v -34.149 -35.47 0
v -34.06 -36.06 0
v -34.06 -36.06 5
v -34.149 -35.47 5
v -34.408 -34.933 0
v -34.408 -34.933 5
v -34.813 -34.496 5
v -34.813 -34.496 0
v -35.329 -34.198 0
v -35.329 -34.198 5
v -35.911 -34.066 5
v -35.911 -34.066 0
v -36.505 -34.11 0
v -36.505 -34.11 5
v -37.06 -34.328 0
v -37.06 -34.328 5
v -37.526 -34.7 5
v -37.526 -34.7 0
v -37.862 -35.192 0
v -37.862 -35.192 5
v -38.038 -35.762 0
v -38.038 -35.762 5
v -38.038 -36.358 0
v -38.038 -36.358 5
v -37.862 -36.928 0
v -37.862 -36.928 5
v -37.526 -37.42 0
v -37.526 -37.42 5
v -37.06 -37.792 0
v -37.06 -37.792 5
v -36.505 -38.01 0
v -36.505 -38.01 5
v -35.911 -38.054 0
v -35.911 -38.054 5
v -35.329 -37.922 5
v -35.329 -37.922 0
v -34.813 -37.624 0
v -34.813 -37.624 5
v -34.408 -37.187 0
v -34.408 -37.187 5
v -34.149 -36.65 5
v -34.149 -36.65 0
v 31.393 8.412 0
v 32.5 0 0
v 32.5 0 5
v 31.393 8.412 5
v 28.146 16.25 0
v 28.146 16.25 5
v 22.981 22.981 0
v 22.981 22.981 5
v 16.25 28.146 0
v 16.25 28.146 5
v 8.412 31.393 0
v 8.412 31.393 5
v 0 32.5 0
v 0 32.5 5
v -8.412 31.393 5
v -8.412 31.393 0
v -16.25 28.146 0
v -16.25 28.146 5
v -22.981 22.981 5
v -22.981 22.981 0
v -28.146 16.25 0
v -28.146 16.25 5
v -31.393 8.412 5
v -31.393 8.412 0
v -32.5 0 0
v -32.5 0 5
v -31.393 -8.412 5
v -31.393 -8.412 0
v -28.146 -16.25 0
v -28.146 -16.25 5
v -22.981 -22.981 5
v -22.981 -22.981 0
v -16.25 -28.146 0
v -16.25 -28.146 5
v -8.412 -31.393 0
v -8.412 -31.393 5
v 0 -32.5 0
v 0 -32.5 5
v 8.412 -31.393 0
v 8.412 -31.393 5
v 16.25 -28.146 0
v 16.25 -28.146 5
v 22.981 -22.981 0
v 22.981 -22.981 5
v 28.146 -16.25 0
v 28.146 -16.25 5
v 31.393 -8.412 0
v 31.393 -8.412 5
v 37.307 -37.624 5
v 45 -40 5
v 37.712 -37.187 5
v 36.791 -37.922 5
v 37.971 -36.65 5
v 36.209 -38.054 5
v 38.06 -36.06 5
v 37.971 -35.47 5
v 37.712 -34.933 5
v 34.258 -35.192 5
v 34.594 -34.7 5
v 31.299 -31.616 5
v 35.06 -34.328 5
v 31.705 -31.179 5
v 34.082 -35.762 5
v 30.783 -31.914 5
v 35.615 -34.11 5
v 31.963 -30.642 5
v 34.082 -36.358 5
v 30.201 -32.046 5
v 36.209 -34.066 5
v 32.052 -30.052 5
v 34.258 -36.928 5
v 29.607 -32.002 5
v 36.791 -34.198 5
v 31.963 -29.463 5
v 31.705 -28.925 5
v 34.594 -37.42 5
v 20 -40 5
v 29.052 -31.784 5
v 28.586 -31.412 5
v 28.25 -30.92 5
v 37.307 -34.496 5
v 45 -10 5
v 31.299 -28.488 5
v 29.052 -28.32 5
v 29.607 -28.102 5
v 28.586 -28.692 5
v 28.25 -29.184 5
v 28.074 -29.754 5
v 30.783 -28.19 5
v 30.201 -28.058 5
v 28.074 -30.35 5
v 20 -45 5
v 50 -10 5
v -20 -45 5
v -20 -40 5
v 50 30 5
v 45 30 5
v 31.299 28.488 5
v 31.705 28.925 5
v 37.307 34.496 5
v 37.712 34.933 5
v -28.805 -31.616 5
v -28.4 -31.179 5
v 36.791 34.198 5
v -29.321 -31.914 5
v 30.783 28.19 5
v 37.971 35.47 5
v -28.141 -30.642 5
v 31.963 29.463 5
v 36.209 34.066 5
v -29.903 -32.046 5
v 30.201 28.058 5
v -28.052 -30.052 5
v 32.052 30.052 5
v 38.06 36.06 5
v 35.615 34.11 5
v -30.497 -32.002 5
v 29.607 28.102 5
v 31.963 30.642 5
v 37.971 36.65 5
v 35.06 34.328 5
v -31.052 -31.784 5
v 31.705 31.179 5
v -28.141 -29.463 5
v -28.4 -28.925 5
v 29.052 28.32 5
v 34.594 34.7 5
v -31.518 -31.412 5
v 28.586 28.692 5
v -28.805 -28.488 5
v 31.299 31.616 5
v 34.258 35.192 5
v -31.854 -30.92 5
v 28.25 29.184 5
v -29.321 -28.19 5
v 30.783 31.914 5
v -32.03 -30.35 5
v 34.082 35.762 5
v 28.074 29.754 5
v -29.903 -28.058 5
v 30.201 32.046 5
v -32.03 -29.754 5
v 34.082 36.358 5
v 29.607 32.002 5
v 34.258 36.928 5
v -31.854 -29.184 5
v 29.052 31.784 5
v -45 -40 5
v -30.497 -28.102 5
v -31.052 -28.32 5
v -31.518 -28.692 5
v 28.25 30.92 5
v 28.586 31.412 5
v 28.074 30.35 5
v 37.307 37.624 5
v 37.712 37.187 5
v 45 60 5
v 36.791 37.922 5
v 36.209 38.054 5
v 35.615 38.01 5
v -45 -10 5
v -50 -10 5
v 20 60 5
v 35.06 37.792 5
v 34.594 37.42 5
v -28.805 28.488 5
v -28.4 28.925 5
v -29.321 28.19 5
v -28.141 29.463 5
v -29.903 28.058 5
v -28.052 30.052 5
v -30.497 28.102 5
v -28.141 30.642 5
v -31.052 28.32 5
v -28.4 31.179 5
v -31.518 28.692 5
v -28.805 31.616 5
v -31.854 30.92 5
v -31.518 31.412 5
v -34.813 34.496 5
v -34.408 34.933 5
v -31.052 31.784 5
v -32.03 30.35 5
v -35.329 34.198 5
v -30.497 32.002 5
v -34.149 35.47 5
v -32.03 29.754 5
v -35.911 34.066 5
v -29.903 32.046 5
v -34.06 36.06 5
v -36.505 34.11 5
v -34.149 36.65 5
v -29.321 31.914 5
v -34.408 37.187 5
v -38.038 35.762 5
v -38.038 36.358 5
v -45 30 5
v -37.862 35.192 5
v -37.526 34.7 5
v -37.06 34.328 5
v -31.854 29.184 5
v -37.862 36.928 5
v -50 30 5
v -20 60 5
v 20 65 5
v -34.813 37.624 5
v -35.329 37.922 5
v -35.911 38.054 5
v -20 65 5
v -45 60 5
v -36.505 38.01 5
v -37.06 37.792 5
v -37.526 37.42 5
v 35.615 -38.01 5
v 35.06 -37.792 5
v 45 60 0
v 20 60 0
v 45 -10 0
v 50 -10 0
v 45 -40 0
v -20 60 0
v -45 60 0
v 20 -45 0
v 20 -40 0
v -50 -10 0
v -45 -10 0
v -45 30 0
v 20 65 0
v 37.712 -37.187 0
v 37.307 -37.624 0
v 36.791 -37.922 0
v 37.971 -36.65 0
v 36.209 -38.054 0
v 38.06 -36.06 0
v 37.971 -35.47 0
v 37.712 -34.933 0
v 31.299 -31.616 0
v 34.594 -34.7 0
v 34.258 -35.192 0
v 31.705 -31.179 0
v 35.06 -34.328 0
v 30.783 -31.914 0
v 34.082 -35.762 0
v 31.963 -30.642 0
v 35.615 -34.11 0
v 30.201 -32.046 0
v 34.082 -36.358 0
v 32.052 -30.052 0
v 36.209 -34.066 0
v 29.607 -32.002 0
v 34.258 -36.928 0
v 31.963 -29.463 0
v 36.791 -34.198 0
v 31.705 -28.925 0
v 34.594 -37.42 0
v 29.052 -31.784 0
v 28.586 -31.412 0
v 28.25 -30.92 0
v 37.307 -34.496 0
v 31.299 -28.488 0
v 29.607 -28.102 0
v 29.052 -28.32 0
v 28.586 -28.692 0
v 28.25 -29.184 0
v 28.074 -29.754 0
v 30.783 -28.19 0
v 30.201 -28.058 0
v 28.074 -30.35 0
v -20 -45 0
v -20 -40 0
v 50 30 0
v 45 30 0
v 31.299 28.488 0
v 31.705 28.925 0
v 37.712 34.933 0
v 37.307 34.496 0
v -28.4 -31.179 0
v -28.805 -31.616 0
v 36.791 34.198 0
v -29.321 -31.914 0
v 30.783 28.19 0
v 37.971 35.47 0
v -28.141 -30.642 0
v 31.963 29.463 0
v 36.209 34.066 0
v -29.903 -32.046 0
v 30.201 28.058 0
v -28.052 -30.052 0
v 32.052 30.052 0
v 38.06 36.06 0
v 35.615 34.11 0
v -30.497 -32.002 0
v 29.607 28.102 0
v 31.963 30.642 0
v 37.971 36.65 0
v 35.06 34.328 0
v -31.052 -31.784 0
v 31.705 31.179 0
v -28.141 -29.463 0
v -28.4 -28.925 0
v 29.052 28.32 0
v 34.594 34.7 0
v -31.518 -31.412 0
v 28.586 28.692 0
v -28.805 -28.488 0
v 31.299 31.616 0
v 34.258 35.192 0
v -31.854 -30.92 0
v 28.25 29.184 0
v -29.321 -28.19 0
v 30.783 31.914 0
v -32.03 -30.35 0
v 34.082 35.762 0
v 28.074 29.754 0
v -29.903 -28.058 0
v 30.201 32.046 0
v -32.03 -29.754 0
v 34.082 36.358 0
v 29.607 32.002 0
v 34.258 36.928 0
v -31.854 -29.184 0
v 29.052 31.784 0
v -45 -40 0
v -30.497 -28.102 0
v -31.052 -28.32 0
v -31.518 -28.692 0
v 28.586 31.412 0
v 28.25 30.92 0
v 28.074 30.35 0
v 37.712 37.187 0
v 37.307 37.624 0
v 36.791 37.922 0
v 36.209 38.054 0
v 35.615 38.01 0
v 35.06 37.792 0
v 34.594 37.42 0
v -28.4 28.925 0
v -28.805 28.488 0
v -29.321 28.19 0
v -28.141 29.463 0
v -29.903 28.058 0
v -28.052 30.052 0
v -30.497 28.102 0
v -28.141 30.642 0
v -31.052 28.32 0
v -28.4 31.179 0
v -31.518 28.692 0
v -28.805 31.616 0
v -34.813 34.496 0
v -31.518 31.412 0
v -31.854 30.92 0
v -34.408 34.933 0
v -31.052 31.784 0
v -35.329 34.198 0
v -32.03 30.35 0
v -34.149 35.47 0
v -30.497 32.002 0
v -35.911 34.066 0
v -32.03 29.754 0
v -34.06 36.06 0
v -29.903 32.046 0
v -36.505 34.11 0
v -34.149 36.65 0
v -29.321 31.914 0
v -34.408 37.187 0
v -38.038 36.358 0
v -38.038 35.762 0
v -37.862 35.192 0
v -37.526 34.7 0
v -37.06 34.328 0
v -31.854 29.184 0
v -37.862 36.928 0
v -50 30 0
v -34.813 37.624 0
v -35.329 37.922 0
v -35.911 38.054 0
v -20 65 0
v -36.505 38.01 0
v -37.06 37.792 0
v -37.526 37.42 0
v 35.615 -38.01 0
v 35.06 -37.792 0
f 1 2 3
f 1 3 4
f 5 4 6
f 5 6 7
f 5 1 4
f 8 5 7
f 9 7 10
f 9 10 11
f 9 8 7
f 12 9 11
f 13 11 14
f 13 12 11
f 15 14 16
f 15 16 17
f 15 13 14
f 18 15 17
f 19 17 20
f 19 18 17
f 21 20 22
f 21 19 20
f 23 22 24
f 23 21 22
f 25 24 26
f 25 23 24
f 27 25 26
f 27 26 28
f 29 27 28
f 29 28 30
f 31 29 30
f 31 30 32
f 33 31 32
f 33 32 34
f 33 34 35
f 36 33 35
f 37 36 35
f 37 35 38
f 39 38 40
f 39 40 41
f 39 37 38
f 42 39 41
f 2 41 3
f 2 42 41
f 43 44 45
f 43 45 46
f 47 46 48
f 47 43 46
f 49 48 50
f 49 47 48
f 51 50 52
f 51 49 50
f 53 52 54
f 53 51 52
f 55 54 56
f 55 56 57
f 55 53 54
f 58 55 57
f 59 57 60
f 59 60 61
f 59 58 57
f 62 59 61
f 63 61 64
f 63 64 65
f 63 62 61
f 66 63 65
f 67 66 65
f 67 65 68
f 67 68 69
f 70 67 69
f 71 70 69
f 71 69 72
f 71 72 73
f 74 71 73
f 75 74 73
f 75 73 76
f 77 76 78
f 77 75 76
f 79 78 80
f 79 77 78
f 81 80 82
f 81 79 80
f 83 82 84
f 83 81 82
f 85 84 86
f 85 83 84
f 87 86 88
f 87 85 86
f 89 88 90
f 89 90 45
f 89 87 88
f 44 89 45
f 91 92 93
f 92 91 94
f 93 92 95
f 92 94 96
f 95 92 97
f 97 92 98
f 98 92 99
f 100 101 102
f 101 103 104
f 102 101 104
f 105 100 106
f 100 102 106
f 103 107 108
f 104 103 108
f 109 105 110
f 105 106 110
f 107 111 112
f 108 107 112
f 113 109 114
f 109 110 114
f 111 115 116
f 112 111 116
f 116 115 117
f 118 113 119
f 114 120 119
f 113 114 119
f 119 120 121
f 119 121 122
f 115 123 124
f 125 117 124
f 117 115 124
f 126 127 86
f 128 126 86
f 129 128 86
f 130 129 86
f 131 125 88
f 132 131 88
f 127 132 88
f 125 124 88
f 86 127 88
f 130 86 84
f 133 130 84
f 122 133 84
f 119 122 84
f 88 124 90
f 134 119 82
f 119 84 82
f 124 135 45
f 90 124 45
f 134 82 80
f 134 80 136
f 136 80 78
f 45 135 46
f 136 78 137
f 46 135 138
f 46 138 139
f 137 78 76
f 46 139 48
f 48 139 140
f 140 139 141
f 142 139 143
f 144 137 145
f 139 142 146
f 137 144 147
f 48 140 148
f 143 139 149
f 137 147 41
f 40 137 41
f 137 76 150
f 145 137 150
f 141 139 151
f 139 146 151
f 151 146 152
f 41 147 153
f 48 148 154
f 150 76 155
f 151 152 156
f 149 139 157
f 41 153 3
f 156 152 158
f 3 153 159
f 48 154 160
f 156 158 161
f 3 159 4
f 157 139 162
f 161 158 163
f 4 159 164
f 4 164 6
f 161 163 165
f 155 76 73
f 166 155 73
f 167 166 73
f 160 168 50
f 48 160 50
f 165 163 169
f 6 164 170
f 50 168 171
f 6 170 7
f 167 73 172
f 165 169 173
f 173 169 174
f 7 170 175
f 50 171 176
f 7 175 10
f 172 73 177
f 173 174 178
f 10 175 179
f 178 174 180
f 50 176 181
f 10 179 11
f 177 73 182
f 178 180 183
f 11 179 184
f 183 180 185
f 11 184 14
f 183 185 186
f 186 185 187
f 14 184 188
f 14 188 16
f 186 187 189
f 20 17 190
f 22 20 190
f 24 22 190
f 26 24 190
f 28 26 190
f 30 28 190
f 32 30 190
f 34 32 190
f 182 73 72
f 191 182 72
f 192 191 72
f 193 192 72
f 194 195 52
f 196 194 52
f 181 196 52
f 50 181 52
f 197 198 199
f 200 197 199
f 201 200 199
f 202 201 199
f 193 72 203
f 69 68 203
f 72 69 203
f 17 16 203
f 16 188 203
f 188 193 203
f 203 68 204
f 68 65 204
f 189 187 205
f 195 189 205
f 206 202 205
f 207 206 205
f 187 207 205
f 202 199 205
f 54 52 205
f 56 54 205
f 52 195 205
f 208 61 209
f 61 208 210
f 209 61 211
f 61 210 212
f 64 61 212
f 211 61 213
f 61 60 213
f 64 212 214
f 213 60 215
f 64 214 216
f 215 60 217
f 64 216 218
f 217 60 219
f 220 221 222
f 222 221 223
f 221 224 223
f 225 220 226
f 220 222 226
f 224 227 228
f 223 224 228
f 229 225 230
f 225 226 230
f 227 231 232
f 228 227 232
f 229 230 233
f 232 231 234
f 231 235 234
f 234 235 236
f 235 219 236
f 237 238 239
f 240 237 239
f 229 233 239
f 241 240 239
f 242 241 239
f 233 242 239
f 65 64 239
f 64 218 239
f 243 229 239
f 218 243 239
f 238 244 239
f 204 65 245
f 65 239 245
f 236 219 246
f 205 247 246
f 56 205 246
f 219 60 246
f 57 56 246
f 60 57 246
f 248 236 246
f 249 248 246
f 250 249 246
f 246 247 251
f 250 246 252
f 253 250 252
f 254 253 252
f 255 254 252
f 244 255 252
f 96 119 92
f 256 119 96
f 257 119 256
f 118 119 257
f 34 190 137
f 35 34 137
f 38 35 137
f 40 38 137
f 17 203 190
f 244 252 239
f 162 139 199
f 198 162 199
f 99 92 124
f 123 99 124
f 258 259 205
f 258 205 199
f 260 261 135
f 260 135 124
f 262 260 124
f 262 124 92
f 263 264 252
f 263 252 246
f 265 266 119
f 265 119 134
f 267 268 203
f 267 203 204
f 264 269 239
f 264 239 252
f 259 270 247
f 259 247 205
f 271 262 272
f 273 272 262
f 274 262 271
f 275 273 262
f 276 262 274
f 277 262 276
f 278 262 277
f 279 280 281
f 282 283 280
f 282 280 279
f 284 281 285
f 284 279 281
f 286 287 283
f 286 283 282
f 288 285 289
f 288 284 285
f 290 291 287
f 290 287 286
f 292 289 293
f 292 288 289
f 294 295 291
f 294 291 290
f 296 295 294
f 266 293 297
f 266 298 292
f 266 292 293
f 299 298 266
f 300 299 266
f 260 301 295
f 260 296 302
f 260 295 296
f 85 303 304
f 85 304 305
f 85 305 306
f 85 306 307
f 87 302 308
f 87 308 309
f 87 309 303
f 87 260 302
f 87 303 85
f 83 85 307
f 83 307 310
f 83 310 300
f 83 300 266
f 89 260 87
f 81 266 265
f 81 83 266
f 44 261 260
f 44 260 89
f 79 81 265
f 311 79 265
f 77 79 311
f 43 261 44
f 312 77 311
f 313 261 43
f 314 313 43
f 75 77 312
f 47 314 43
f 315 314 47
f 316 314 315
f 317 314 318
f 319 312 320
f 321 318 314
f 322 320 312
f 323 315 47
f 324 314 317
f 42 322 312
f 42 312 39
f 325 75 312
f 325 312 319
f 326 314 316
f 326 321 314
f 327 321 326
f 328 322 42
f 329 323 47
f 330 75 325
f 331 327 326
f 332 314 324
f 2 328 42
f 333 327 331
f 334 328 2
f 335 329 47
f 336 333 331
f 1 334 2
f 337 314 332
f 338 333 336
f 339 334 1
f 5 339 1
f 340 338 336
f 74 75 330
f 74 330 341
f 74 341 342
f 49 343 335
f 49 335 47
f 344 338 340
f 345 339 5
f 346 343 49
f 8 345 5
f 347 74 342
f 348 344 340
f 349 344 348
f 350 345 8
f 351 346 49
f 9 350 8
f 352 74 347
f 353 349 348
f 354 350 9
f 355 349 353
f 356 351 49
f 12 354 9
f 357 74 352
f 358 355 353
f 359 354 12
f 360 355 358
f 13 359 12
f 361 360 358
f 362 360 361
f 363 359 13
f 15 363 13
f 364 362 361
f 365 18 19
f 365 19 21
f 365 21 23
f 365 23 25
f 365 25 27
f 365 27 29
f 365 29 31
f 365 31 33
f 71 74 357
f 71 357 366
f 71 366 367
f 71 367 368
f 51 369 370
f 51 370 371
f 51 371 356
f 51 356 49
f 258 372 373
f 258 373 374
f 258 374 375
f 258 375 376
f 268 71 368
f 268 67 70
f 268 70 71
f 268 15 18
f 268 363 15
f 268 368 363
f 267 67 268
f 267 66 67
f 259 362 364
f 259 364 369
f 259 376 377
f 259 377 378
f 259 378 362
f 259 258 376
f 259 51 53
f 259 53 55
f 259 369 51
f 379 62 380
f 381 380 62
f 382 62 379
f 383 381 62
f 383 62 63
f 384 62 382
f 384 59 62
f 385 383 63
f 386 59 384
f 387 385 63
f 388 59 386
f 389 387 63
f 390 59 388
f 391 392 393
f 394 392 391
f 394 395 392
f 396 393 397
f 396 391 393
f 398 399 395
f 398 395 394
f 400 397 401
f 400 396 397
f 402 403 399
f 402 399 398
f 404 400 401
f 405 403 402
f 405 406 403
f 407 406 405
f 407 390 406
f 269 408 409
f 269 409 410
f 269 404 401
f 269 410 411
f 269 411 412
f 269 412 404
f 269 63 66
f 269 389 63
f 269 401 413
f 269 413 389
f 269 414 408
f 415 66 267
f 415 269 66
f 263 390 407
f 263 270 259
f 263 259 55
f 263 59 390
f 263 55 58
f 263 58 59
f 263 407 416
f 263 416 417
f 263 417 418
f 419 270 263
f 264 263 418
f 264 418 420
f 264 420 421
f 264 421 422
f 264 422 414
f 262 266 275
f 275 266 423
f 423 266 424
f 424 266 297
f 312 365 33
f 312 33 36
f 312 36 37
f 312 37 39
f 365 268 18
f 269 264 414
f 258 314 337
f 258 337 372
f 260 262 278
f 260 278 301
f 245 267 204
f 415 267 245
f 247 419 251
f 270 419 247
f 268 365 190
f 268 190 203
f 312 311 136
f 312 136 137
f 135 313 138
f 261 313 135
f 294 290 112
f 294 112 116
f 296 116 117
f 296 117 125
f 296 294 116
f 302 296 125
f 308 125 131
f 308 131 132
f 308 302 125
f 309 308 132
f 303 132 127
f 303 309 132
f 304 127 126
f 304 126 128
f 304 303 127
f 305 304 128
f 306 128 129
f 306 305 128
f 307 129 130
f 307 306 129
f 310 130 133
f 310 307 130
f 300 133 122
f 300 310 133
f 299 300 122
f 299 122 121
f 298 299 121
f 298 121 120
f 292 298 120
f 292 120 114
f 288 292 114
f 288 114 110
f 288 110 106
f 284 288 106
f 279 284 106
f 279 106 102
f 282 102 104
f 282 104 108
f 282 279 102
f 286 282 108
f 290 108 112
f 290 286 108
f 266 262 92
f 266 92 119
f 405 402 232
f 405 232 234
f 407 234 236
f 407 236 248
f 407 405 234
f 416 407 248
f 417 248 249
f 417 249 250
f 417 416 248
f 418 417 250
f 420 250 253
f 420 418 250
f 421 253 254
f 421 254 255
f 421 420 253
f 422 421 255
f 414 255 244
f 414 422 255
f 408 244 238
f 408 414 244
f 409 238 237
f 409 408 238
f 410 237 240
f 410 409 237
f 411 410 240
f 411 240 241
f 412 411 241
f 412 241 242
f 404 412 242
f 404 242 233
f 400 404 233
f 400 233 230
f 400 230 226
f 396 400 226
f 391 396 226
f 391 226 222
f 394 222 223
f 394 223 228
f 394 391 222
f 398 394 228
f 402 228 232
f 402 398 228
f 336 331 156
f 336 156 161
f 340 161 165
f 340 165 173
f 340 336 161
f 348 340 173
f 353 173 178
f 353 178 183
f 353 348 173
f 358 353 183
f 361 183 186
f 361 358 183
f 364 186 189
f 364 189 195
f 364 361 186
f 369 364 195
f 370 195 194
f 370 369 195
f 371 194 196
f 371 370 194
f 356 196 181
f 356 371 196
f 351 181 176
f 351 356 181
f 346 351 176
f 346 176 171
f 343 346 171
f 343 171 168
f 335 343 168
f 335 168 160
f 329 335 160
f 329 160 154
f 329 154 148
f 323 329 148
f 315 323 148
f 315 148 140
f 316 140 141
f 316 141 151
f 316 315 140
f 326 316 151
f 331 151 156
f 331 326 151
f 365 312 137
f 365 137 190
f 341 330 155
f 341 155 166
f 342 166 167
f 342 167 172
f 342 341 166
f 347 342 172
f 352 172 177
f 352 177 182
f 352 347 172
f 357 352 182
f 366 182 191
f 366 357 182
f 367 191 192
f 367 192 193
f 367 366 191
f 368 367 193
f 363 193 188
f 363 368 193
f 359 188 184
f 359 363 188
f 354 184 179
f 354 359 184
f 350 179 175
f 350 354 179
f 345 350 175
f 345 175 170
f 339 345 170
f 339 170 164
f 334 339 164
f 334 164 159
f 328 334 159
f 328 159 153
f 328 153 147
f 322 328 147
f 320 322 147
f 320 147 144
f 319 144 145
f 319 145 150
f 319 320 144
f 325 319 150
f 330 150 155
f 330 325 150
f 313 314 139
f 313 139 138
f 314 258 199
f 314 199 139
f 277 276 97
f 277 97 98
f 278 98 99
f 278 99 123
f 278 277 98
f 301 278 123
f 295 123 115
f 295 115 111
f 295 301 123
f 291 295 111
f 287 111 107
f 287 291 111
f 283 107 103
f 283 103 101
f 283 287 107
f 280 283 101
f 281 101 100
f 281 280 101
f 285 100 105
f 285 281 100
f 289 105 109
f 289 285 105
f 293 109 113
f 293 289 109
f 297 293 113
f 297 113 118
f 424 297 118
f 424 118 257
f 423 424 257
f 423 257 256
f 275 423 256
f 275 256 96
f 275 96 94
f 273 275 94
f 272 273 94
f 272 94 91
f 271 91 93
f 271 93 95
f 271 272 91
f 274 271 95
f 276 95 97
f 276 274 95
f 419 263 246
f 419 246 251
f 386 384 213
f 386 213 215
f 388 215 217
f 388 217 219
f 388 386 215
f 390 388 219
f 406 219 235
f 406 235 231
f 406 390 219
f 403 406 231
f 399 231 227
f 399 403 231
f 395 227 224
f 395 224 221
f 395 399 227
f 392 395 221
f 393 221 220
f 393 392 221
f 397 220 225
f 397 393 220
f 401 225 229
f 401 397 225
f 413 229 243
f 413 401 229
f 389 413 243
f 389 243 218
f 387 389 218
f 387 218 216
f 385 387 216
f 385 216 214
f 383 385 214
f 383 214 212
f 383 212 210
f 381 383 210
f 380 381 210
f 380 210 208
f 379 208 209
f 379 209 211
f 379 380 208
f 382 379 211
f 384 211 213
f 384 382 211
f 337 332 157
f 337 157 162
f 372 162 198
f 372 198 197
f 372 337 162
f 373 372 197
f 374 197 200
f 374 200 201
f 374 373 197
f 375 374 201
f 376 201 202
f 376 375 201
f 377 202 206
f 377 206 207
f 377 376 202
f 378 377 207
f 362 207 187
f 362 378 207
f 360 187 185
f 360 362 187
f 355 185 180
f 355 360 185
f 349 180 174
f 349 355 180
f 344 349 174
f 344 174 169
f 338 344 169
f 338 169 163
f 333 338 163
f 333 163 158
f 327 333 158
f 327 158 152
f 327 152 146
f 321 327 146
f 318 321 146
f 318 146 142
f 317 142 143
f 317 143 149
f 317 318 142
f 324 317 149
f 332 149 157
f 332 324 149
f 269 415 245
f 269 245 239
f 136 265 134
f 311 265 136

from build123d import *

# Parameters (mm, degrees)
SKETCH1_R           = 2
SKETCH1_R_2         = 32.5
BOSS_EXTRUDE1_DEPTH = 5


with BuildPart() as part:
    # Sketch1 → Boss-Extrude1 (new body)
    with BuildSketch(Plane.XY):
        Polygon((45, -40), (20, -40), (20, -45), (-20, -45), (-20, -40), (-45, -40), (-45, -10), (-50, -10), (-50, 30), (-45, 30), (-45, 60), (-20, 60), (-20, 65), (20, 65), (20, 60), (45, 60), (45, 30), (50, 30), (50, -10), (45, -10), align=None)
        with Locations((-36.06, 36.06)):
            Circle(SKETCH1_R, mode=Mode.SUBTRACT)
        with Locations((36.06, 36.06)):
            Circle(SKETCH1_R, mode=Mode.SUBTRACT)
        with Locations((36.06, -36.06)):
            Circle(SKETCH1_R, mode=Mode.SUBTRACT)
        with Locations((-36.06, -36.06)):
            Circle(SKETCH1_R, mode=Mode.SUBTRACT)
        Circle(SKETCH1_R_2, mode=Mode.SUBTRACT)
        with Locations((-30.0520382, 30.0520382)):
            Circle(SKETCH1_R, mode=Mode.SUBTRACT)
        with Locations((30.0520382, 30.0520382)):
            Circle(SKETCH1_R, mode=Mode.SUBTRACT)
        with Locations((30.0520382, -30.0520382)):
            Circle(SKETCH1_R, mode=Mode.SUBTRACT)
        with Locations((-30.0520382, -30.0520382)):
            Circle(SKETCH1_R, mode=Mode.SUBTRACT)
    extrude(amount=BOSS_EXTRUDE1_DEPTH)


solid = part.part
